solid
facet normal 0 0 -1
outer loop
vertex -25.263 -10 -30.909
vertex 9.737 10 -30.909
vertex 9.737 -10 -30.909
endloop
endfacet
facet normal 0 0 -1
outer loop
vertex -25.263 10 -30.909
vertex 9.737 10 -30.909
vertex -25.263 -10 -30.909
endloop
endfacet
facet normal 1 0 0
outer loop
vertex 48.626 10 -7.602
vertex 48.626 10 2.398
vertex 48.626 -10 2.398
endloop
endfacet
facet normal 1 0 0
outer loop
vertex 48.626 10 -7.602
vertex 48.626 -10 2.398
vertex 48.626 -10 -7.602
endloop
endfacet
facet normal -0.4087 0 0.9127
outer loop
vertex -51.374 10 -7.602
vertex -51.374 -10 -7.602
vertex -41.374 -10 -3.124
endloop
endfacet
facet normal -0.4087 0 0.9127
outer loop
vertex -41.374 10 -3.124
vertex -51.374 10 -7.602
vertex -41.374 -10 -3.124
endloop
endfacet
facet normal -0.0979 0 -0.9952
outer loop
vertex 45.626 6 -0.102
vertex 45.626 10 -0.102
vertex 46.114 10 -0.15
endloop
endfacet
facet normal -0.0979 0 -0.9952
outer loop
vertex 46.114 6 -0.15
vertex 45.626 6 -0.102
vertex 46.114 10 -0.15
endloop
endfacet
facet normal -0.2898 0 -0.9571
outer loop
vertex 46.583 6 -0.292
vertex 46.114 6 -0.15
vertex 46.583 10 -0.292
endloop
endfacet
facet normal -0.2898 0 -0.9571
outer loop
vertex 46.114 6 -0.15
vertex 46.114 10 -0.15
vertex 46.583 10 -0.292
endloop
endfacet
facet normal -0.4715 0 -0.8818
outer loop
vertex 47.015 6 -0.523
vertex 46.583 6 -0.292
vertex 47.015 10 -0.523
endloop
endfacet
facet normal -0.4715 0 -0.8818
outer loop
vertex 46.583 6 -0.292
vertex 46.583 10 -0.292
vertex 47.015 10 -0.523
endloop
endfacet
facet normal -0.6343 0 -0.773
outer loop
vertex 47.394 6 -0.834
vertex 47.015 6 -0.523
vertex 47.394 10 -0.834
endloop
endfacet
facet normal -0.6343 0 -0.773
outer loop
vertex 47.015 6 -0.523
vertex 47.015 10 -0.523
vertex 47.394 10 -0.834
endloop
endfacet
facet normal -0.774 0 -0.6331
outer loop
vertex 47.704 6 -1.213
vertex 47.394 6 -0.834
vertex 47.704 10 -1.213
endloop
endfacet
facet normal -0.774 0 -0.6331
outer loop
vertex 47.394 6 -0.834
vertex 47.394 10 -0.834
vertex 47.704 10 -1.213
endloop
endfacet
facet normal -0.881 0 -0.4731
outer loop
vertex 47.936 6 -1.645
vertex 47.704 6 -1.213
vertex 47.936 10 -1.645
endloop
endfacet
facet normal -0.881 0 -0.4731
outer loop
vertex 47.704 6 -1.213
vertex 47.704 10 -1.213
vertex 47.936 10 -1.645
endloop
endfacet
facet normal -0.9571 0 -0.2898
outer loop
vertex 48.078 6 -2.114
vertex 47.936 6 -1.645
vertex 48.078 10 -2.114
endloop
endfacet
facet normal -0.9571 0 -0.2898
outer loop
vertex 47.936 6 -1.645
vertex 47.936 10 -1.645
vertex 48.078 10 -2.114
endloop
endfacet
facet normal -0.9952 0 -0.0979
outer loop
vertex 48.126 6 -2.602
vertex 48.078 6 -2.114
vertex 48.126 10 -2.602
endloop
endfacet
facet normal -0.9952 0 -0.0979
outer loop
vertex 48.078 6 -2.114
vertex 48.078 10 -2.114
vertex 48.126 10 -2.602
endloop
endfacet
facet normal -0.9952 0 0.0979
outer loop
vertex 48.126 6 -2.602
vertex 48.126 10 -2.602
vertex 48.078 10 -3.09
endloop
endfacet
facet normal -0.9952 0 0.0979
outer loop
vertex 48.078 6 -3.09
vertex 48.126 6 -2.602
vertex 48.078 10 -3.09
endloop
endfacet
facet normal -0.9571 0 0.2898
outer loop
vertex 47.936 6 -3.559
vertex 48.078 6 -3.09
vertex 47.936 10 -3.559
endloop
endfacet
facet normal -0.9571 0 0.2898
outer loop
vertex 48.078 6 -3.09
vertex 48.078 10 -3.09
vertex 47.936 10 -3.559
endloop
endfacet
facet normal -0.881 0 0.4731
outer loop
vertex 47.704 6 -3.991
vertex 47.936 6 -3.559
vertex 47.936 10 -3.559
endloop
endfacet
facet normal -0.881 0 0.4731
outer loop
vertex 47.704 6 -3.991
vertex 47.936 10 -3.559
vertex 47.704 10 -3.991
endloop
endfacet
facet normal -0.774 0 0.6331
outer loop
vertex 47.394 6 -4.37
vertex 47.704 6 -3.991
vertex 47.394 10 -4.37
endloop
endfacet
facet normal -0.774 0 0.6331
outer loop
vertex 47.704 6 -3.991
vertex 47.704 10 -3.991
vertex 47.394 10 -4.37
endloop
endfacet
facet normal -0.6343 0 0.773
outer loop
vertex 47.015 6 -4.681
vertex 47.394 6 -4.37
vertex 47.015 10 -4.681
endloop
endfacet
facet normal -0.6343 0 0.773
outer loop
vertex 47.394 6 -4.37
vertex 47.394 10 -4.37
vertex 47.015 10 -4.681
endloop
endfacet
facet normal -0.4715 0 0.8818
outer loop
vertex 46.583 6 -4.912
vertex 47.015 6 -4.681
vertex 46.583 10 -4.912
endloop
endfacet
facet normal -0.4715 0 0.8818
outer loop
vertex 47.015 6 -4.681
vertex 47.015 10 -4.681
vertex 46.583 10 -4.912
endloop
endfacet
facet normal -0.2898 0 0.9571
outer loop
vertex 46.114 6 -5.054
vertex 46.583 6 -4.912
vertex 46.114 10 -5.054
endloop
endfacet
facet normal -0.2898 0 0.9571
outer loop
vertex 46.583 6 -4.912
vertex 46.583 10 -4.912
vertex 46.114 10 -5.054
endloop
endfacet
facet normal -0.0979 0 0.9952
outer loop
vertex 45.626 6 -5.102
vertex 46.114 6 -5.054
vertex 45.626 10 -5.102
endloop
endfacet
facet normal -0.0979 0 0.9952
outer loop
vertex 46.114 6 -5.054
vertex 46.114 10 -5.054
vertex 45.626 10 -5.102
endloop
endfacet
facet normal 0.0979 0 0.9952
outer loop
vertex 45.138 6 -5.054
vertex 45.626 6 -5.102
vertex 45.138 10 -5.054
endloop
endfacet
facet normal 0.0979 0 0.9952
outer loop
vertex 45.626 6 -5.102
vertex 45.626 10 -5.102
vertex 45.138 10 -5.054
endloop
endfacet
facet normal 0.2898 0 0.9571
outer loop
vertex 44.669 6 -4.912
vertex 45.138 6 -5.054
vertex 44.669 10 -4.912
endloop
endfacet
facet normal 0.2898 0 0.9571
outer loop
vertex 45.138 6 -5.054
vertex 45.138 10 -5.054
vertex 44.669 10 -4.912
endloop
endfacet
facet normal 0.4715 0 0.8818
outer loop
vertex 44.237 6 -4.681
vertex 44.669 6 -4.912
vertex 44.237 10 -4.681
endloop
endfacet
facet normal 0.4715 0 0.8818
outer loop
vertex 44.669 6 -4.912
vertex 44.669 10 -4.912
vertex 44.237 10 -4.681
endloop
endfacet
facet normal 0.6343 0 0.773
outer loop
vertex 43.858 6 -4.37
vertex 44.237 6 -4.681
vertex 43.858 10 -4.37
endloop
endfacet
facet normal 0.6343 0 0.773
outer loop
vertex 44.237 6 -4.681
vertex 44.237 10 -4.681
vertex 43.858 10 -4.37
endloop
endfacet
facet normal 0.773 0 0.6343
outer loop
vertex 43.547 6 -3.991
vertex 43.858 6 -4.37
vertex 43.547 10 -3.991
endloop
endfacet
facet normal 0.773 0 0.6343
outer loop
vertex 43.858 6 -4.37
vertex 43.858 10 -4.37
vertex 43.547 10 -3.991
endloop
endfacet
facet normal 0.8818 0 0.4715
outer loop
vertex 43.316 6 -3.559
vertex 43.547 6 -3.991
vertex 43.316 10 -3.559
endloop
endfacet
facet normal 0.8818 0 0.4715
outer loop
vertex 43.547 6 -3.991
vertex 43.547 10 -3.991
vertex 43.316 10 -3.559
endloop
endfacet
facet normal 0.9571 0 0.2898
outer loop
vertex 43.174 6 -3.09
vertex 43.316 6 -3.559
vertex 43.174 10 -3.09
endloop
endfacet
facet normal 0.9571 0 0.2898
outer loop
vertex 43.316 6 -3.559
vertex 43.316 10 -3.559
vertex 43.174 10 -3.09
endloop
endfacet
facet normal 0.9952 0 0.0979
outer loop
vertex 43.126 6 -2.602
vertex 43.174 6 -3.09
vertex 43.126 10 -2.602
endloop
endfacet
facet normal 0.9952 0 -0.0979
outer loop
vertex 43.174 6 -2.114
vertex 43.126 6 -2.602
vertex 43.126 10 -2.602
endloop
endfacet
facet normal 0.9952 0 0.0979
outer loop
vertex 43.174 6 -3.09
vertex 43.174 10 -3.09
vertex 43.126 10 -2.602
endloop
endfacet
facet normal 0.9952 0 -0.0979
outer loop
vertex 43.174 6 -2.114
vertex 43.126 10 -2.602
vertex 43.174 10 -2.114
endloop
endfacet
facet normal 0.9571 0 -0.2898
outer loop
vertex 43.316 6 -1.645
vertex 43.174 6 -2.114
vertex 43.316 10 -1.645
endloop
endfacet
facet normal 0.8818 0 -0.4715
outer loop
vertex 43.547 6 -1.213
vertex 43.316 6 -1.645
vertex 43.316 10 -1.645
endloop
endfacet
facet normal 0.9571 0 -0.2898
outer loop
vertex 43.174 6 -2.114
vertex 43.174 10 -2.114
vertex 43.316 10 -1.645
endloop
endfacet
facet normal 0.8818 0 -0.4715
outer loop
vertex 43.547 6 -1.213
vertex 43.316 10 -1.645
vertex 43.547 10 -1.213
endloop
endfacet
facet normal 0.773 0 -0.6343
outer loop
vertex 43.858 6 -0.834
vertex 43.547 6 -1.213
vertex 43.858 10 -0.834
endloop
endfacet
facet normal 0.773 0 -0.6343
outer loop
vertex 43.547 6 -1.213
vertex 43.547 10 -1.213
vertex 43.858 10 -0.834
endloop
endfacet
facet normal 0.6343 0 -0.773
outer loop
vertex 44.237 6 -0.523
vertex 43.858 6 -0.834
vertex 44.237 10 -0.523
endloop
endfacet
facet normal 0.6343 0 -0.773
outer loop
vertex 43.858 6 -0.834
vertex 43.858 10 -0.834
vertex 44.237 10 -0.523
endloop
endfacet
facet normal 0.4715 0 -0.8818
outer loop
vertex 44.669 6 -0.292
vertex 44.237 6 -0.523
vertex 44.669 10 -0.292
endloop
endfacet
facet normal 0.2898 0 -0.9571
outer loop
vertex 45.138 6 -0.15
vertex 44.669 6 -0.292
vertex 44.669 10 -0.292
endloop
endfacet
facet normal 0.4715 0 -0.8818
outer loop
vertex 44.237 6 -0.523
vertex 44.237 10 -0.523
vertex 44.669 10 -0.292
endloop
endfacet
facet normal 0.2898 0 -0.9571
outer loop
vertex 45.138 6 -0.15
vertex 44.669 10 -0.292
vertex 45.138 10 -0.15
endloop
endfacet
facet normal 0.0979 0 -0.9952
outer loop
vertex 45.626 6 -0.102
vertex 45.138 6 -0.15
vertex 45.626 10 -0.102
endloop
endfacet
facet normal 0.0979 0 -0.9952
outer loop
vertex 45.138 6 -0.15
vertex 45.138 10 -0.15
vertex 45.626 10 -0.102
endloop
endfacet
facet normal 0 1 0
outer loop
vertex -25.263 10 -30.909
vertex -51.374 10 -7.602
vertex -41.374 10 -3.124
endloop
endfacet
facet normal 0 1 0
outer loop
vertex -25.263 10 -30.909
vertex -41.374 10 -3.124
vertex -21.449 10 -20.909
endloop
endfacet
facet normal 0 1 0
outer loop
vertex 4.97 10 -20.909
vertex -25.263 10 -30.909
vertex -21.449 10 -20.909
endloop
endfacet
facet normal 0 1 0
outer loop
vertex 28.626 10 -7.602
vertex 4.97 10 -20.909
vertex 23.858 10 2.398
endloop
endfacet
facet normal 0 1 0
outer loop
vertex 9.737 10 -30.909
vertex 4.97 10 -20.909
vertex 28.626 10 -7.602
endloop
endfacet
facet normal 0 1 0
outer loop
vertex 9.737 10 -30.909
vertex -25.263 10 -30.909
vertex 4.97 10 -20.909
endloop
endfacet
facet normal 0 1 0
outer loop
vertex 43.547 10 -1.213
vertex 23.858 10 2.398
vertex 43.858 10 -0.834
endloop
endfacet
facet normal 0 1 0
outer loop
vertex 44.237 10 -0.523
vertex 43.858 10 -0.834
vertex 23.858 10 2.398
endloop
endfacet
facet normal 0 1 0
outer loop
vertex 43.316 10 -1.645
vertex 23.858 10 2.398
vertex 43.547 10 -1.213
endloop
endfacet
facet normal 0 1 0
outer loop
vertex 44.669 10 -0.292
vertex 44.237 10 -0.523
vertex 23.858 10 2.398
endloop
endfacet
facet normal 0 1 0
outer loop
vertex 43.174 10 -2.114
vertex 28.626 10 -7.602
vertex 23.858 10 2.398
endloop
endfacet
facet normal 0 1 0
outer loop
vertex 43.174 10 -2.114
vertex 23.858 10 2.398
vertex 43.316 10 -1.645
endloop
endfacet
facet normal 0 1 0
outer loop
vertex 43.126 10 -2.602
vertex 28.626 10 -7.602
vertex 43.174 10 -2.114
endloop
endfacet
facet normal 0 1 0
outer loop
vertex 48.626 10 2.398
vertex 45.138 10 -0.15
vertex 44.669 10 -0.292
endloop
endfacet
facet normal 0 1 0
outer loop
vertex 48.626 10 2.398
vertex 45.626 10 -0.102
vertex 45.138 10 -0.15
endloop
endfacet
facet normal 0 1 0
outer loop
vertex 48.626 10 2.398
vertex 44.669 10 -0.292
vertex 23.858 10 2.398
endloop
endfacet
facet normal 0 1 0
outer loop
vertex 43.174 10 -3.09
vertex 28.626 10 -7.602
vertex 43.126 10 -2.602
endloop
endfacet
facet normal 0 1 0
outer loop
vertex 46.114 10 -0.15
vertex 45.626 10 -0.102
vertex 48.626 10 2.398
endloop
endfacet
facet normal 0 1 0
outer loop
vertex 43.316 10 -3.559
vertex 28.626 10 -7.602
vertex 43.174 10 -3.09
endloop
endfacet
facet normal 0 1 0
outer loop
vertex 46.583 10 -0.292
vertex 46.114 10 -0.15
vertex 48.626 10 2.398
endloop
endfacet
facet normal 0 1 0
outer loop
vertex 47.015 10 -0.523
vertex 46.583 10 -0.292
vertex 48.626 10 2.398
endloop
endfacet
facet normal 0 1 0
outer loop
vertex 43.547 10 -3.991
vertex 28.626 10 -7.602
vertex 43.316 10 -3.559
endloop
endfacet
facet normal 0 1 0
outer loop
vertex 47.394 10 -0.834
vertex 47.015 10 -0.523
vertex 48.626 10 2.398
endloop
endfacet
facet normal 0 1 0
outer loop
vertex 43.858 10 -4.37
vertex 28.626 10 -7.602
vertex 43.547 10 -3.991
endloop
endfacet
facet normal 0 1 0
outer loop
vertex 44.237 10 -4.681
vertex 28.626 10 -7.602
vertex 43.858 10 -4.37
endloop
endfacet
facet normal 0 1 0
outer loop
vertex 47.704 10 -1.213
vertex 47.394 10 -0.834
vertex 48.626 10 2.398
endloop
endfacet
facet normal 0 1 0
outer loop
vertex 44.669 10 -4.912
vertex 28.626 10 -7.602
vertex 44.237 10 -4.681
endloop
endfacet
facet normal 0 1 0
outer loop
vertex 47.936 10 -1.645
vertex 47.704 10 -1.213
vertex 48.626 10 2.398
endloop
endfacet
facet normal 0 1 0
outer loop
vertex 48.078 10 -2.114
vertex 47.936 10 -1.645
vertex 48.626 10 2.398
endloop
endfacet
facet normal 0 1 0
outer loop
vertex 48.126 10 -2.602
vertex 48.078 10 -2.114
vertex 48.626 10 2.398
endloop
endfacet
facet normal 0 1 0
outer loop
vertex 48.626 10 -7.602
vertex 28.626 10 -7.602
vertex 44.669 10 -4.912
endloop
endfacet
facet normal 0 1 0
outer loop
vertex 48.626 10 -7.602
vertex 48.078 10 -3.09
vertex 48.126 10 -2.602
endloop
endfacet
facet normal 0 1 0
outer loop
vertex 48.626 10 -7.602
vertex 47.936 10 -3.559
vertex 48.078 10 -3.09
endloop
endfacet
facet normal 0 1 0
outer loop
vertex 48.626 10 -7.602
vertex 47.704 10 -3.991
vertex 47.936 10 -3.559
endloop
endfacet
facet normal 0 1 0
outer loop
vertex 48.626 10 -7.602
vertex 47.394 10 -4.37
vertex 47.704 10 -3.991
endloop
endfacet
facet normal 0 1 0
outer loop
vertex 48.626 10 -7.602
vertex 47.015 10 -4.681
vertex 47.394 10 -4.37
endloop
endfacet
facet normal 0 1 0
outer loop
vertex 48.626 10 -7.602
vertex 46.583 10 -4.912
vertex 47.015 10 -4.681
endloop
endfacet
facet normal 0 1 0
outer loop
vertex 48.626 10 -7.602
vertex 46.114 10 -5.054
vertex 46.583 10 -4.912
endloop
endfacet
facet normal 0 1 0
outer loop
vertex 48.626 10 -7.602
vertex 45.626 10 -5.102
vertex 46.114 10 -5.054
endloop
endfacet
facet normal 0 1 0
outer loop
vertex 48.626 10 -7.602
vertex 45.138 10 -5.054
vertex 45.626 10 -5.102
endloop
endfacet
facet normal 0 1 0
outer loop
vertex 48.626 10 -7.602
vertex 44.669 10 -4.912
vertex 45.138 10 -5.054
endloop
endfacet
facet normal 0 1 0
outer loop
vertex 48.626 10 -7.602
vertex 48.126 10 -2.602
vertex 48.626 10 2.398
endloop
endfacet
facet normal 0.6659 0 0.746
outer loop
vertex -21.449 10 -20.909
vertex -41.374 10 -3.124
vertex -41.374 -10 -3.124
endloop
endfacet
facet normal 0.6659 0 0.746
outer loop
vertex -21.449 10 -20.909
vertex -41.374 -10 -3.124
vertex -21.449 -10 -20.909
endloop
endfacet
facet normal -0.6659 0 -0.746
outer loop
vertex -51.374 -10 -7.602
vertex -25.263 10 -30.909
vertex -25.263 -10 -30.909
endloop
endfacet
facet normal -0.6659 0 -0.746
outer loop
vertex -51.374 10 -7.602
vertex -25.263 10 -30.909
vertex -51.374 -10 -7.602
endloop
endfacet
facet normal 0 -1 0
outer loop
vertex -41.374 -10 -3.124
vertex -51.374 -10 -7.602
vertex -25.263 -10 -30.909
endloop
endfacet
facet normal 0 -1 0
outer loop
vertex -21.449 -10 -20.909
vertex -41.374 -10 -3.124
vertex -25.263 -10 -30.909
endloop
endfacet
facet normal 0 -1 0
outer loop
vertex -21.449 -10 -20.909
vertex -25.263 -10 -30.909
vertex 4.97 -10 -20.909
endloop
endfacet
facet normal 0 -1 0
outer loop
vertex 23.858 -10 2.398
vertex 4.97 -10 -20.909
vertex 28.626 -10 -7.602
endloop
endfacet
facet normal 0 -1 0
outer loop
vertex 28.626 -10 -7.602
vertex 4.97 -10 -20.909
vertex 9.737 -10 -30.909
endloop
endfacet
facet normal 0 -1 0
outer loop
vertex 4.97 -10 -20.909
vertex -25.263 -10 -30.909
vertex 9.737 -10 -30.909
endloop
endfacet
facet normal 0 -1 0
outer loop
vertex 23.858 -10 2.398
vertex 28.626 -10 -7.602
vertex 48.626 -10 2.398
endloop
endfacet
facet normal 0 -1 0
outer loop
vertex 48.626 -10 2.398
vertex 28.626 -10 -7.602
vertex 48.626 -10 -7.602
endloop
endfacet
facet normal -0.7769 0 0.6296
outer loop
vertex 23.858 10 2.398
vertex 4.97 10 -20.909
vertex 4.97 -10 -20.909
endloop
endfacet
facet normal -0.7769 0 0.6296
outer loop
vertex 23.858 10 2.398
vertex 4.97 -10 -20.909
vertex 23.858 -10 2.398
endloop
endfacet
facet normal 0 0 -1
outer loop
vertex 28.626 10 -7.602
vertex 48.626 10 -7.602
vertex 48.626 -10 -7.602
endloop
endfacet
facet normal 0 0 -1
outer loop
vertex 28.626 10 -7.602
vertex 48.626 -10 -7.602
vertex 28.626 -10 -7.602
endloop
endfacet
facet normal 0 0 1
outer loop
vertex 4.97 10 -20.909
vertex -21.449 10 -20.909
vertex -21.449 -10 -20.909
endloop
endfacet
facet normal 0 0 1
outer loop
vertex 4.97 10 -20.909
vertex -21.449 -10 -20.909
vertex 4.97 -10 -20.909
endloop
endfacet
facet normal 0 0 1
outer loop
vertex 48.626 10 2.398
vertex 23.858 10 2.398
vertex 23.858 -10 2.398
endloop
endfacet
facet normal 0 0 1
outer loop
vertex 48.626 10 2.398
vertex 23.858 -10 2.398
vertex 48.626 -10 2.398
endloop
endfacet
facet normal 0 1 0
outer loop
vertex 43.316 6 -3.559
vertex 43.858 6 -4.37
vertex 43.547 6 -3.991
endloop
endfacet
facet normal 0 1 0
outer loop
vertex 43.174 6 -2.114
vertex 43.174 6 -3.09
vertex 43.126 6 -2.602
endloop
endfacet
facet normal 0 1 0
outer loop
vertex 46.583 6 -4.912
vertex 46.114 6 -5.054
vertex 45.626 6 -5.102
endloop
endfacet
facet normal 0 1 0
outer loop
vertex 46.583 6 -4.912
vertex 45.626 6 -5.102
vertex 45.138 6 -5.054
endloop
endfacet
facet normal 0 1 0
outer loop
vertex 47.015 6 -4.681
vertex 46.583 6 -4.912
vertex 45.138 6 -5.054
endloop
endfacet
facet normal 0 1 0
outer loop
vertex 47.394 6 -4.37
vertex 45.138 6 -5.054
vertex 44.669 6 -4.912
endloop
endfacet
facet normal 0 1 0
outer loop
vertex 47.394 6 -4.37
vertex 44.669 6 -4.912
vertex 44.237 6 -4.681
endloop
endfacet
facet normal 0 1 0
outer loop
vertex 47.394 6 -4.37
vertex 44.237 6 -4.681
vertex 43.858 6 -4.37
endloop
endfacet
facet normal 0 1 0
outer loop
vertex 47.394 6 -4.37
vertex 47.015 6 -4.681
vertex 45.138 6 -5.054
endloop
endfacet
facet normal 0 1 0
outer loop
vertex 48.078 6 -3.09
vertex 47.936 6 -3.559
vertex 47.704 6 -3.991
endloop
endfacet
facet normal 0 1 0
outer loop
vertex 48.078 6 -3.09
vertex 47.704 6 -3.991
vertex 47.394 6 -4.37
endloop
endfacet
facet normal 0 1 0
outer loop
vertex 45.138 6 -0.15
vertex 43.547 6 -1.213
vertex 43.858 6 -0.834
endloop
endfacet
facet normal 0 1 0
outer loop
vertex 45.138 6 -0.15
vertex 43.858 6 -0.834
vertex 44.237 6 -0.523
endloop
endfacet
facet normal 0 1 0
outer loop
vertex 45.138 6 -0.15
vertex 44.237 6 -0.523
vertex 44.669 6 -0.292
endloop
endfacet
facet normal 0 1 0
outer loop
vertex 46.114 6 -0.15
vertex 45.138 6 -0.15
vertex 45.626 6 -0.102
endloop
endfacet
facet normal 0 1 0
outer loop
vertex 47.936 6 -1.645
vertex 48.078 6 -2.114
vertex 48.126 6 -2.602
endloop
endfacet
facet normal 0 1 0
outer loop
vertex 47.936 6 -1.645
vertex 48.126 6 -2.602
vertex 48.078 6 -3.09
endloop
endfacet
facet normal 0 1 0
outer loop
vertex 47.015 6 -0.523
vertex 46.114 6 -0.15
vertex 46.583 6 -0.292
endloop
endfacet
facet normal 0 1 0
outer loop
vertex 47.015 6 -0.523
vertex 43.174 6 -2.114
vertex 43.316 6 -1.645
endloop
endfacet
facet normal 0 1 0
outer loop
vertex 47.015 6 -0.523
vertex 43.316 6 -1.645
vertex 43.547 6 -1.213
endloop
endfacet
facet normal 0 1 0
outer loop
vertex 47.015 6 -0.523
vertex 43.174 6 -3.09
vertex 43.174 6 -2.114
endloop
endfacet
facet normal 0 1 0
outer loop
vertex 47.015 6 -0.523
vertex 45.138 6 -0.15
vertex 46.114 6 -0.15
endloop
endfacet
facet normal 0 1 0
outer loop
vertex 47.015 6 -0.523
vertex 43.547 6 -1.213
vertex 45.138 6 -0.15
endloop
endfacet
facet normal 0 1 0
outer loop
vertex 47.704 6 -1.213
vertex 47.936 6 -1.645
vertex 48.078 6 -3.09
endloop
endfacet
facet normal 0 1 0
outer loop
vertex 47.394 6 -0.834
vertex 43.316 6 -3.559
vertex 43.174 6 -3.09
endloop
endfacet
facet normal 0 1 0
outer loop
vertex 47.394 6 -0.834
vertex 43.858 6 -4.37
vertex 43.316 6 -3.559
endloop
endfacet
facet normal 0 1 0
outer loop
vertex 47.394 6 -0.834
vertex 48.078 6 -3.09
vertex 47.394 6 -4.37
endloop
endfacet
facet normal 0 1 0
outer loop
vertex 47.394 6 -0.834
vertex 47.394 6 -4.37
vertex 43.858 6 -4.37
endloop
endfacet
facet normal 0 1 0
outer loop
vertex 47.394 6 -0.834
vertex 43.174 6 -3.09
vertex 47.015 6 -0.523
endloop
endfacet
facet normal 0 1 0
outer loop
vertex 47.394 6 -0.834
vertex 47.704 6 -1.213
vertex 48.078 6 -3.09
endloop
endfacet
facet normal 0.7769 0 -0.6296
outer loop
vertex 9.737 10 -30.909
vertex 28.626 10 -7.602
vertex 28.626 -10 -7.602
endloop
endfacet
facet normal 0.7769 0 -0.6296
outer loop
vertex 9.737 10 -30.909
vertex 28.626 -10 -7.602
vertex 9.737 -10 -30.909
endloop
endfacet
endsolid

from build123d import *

# Parameters (mm, degrees)
BOSS_EXTRUDE1_DEPTH      = 10
BOSS_EXTRUDE1_DEPTH_BACK = 10
SKETCH2_R                = 2.5
CUT_EXTRUDE1_DEPTH       = 4
SPLIT2_SURFACE_1_BACK    = 108.282
SPLIT2_SURFACE_1_DEPTH   = 216.564


with BuildPart() as part:
    # Sketch1 → Boss-Extrude1 (new, two sides)
    with BuildSketch(Plane(origin=(0, 0, 0), x_dir=(1, 0, 0), z_dir=(0, 1, 0))) as boss_extrude1_sk:
        Polygon((-51.374196063, 7.601926758), (-51.374196063, -2.398073242), (-41.374196063, -2.398073242), (-41.374196063, 3.123704189), (-21.449234595, 20.908790051), (4.969602102, 20.908790051), (23.858490991, -2.398073242), (48.625803937, -2.398073242), (48.625803937, 7.601926758), (28.625803937, 7.601926758), (9.736915048, 30.908790051), (-25.263084952, 30.908790051), align=None)
    extrude(amount=BOSS_EXTRUDE1_DEPTH)
    extrude(boss_extrude1_sk.sketch, amount=-BOSS_EXTRUDE1_DEPTH_BACK)

    # Sketch2 → Cut-Extrude1 (cut)
    with BuildSketch(Plane(origin=(0, 10, 0), x_dir=(1, 0, 0), z_dir=(0, 1, 0))):
        with Locations(Location((45.625803937, 2.601926758, 0), (0, 0, 270))):
            Circle(SKETCH2_R)
    extrude(amount=-CUT_EXTRUDE1_DEPTH, mode=Mode.SUBTRACT)

    # Split2: cut with a surface, the side behind it stays
    # Split2 surface: a surface, the sketch's curves swept straight by 216.564 mm
    with BuildLine(Plane(origin=(0, -10, 0), x_dir=(-1, 0, 0), z_dir=(0, -1, 0)).offset(-SPLIT2_SURFACE_1_BACK), mode=Mode.PRIVATE) as split2_surface_1_path:
        Line((51.374196063, 7.601926758), (41.374196063, 3.123704189))
    split2_surface_1 = Shell.extrude(split2_surface_1_path.wire(), (0 * SPLIT2_SURFACE_1_DEPTH, -1 * SPLIT2_SURFACE_1_DEPTH, 0 * SPLIT2_SURFACE_1_DEPTH))
    split(bisect_by=split2_surface_1, keep=Keep.BOTTOM)


solid = part.part
